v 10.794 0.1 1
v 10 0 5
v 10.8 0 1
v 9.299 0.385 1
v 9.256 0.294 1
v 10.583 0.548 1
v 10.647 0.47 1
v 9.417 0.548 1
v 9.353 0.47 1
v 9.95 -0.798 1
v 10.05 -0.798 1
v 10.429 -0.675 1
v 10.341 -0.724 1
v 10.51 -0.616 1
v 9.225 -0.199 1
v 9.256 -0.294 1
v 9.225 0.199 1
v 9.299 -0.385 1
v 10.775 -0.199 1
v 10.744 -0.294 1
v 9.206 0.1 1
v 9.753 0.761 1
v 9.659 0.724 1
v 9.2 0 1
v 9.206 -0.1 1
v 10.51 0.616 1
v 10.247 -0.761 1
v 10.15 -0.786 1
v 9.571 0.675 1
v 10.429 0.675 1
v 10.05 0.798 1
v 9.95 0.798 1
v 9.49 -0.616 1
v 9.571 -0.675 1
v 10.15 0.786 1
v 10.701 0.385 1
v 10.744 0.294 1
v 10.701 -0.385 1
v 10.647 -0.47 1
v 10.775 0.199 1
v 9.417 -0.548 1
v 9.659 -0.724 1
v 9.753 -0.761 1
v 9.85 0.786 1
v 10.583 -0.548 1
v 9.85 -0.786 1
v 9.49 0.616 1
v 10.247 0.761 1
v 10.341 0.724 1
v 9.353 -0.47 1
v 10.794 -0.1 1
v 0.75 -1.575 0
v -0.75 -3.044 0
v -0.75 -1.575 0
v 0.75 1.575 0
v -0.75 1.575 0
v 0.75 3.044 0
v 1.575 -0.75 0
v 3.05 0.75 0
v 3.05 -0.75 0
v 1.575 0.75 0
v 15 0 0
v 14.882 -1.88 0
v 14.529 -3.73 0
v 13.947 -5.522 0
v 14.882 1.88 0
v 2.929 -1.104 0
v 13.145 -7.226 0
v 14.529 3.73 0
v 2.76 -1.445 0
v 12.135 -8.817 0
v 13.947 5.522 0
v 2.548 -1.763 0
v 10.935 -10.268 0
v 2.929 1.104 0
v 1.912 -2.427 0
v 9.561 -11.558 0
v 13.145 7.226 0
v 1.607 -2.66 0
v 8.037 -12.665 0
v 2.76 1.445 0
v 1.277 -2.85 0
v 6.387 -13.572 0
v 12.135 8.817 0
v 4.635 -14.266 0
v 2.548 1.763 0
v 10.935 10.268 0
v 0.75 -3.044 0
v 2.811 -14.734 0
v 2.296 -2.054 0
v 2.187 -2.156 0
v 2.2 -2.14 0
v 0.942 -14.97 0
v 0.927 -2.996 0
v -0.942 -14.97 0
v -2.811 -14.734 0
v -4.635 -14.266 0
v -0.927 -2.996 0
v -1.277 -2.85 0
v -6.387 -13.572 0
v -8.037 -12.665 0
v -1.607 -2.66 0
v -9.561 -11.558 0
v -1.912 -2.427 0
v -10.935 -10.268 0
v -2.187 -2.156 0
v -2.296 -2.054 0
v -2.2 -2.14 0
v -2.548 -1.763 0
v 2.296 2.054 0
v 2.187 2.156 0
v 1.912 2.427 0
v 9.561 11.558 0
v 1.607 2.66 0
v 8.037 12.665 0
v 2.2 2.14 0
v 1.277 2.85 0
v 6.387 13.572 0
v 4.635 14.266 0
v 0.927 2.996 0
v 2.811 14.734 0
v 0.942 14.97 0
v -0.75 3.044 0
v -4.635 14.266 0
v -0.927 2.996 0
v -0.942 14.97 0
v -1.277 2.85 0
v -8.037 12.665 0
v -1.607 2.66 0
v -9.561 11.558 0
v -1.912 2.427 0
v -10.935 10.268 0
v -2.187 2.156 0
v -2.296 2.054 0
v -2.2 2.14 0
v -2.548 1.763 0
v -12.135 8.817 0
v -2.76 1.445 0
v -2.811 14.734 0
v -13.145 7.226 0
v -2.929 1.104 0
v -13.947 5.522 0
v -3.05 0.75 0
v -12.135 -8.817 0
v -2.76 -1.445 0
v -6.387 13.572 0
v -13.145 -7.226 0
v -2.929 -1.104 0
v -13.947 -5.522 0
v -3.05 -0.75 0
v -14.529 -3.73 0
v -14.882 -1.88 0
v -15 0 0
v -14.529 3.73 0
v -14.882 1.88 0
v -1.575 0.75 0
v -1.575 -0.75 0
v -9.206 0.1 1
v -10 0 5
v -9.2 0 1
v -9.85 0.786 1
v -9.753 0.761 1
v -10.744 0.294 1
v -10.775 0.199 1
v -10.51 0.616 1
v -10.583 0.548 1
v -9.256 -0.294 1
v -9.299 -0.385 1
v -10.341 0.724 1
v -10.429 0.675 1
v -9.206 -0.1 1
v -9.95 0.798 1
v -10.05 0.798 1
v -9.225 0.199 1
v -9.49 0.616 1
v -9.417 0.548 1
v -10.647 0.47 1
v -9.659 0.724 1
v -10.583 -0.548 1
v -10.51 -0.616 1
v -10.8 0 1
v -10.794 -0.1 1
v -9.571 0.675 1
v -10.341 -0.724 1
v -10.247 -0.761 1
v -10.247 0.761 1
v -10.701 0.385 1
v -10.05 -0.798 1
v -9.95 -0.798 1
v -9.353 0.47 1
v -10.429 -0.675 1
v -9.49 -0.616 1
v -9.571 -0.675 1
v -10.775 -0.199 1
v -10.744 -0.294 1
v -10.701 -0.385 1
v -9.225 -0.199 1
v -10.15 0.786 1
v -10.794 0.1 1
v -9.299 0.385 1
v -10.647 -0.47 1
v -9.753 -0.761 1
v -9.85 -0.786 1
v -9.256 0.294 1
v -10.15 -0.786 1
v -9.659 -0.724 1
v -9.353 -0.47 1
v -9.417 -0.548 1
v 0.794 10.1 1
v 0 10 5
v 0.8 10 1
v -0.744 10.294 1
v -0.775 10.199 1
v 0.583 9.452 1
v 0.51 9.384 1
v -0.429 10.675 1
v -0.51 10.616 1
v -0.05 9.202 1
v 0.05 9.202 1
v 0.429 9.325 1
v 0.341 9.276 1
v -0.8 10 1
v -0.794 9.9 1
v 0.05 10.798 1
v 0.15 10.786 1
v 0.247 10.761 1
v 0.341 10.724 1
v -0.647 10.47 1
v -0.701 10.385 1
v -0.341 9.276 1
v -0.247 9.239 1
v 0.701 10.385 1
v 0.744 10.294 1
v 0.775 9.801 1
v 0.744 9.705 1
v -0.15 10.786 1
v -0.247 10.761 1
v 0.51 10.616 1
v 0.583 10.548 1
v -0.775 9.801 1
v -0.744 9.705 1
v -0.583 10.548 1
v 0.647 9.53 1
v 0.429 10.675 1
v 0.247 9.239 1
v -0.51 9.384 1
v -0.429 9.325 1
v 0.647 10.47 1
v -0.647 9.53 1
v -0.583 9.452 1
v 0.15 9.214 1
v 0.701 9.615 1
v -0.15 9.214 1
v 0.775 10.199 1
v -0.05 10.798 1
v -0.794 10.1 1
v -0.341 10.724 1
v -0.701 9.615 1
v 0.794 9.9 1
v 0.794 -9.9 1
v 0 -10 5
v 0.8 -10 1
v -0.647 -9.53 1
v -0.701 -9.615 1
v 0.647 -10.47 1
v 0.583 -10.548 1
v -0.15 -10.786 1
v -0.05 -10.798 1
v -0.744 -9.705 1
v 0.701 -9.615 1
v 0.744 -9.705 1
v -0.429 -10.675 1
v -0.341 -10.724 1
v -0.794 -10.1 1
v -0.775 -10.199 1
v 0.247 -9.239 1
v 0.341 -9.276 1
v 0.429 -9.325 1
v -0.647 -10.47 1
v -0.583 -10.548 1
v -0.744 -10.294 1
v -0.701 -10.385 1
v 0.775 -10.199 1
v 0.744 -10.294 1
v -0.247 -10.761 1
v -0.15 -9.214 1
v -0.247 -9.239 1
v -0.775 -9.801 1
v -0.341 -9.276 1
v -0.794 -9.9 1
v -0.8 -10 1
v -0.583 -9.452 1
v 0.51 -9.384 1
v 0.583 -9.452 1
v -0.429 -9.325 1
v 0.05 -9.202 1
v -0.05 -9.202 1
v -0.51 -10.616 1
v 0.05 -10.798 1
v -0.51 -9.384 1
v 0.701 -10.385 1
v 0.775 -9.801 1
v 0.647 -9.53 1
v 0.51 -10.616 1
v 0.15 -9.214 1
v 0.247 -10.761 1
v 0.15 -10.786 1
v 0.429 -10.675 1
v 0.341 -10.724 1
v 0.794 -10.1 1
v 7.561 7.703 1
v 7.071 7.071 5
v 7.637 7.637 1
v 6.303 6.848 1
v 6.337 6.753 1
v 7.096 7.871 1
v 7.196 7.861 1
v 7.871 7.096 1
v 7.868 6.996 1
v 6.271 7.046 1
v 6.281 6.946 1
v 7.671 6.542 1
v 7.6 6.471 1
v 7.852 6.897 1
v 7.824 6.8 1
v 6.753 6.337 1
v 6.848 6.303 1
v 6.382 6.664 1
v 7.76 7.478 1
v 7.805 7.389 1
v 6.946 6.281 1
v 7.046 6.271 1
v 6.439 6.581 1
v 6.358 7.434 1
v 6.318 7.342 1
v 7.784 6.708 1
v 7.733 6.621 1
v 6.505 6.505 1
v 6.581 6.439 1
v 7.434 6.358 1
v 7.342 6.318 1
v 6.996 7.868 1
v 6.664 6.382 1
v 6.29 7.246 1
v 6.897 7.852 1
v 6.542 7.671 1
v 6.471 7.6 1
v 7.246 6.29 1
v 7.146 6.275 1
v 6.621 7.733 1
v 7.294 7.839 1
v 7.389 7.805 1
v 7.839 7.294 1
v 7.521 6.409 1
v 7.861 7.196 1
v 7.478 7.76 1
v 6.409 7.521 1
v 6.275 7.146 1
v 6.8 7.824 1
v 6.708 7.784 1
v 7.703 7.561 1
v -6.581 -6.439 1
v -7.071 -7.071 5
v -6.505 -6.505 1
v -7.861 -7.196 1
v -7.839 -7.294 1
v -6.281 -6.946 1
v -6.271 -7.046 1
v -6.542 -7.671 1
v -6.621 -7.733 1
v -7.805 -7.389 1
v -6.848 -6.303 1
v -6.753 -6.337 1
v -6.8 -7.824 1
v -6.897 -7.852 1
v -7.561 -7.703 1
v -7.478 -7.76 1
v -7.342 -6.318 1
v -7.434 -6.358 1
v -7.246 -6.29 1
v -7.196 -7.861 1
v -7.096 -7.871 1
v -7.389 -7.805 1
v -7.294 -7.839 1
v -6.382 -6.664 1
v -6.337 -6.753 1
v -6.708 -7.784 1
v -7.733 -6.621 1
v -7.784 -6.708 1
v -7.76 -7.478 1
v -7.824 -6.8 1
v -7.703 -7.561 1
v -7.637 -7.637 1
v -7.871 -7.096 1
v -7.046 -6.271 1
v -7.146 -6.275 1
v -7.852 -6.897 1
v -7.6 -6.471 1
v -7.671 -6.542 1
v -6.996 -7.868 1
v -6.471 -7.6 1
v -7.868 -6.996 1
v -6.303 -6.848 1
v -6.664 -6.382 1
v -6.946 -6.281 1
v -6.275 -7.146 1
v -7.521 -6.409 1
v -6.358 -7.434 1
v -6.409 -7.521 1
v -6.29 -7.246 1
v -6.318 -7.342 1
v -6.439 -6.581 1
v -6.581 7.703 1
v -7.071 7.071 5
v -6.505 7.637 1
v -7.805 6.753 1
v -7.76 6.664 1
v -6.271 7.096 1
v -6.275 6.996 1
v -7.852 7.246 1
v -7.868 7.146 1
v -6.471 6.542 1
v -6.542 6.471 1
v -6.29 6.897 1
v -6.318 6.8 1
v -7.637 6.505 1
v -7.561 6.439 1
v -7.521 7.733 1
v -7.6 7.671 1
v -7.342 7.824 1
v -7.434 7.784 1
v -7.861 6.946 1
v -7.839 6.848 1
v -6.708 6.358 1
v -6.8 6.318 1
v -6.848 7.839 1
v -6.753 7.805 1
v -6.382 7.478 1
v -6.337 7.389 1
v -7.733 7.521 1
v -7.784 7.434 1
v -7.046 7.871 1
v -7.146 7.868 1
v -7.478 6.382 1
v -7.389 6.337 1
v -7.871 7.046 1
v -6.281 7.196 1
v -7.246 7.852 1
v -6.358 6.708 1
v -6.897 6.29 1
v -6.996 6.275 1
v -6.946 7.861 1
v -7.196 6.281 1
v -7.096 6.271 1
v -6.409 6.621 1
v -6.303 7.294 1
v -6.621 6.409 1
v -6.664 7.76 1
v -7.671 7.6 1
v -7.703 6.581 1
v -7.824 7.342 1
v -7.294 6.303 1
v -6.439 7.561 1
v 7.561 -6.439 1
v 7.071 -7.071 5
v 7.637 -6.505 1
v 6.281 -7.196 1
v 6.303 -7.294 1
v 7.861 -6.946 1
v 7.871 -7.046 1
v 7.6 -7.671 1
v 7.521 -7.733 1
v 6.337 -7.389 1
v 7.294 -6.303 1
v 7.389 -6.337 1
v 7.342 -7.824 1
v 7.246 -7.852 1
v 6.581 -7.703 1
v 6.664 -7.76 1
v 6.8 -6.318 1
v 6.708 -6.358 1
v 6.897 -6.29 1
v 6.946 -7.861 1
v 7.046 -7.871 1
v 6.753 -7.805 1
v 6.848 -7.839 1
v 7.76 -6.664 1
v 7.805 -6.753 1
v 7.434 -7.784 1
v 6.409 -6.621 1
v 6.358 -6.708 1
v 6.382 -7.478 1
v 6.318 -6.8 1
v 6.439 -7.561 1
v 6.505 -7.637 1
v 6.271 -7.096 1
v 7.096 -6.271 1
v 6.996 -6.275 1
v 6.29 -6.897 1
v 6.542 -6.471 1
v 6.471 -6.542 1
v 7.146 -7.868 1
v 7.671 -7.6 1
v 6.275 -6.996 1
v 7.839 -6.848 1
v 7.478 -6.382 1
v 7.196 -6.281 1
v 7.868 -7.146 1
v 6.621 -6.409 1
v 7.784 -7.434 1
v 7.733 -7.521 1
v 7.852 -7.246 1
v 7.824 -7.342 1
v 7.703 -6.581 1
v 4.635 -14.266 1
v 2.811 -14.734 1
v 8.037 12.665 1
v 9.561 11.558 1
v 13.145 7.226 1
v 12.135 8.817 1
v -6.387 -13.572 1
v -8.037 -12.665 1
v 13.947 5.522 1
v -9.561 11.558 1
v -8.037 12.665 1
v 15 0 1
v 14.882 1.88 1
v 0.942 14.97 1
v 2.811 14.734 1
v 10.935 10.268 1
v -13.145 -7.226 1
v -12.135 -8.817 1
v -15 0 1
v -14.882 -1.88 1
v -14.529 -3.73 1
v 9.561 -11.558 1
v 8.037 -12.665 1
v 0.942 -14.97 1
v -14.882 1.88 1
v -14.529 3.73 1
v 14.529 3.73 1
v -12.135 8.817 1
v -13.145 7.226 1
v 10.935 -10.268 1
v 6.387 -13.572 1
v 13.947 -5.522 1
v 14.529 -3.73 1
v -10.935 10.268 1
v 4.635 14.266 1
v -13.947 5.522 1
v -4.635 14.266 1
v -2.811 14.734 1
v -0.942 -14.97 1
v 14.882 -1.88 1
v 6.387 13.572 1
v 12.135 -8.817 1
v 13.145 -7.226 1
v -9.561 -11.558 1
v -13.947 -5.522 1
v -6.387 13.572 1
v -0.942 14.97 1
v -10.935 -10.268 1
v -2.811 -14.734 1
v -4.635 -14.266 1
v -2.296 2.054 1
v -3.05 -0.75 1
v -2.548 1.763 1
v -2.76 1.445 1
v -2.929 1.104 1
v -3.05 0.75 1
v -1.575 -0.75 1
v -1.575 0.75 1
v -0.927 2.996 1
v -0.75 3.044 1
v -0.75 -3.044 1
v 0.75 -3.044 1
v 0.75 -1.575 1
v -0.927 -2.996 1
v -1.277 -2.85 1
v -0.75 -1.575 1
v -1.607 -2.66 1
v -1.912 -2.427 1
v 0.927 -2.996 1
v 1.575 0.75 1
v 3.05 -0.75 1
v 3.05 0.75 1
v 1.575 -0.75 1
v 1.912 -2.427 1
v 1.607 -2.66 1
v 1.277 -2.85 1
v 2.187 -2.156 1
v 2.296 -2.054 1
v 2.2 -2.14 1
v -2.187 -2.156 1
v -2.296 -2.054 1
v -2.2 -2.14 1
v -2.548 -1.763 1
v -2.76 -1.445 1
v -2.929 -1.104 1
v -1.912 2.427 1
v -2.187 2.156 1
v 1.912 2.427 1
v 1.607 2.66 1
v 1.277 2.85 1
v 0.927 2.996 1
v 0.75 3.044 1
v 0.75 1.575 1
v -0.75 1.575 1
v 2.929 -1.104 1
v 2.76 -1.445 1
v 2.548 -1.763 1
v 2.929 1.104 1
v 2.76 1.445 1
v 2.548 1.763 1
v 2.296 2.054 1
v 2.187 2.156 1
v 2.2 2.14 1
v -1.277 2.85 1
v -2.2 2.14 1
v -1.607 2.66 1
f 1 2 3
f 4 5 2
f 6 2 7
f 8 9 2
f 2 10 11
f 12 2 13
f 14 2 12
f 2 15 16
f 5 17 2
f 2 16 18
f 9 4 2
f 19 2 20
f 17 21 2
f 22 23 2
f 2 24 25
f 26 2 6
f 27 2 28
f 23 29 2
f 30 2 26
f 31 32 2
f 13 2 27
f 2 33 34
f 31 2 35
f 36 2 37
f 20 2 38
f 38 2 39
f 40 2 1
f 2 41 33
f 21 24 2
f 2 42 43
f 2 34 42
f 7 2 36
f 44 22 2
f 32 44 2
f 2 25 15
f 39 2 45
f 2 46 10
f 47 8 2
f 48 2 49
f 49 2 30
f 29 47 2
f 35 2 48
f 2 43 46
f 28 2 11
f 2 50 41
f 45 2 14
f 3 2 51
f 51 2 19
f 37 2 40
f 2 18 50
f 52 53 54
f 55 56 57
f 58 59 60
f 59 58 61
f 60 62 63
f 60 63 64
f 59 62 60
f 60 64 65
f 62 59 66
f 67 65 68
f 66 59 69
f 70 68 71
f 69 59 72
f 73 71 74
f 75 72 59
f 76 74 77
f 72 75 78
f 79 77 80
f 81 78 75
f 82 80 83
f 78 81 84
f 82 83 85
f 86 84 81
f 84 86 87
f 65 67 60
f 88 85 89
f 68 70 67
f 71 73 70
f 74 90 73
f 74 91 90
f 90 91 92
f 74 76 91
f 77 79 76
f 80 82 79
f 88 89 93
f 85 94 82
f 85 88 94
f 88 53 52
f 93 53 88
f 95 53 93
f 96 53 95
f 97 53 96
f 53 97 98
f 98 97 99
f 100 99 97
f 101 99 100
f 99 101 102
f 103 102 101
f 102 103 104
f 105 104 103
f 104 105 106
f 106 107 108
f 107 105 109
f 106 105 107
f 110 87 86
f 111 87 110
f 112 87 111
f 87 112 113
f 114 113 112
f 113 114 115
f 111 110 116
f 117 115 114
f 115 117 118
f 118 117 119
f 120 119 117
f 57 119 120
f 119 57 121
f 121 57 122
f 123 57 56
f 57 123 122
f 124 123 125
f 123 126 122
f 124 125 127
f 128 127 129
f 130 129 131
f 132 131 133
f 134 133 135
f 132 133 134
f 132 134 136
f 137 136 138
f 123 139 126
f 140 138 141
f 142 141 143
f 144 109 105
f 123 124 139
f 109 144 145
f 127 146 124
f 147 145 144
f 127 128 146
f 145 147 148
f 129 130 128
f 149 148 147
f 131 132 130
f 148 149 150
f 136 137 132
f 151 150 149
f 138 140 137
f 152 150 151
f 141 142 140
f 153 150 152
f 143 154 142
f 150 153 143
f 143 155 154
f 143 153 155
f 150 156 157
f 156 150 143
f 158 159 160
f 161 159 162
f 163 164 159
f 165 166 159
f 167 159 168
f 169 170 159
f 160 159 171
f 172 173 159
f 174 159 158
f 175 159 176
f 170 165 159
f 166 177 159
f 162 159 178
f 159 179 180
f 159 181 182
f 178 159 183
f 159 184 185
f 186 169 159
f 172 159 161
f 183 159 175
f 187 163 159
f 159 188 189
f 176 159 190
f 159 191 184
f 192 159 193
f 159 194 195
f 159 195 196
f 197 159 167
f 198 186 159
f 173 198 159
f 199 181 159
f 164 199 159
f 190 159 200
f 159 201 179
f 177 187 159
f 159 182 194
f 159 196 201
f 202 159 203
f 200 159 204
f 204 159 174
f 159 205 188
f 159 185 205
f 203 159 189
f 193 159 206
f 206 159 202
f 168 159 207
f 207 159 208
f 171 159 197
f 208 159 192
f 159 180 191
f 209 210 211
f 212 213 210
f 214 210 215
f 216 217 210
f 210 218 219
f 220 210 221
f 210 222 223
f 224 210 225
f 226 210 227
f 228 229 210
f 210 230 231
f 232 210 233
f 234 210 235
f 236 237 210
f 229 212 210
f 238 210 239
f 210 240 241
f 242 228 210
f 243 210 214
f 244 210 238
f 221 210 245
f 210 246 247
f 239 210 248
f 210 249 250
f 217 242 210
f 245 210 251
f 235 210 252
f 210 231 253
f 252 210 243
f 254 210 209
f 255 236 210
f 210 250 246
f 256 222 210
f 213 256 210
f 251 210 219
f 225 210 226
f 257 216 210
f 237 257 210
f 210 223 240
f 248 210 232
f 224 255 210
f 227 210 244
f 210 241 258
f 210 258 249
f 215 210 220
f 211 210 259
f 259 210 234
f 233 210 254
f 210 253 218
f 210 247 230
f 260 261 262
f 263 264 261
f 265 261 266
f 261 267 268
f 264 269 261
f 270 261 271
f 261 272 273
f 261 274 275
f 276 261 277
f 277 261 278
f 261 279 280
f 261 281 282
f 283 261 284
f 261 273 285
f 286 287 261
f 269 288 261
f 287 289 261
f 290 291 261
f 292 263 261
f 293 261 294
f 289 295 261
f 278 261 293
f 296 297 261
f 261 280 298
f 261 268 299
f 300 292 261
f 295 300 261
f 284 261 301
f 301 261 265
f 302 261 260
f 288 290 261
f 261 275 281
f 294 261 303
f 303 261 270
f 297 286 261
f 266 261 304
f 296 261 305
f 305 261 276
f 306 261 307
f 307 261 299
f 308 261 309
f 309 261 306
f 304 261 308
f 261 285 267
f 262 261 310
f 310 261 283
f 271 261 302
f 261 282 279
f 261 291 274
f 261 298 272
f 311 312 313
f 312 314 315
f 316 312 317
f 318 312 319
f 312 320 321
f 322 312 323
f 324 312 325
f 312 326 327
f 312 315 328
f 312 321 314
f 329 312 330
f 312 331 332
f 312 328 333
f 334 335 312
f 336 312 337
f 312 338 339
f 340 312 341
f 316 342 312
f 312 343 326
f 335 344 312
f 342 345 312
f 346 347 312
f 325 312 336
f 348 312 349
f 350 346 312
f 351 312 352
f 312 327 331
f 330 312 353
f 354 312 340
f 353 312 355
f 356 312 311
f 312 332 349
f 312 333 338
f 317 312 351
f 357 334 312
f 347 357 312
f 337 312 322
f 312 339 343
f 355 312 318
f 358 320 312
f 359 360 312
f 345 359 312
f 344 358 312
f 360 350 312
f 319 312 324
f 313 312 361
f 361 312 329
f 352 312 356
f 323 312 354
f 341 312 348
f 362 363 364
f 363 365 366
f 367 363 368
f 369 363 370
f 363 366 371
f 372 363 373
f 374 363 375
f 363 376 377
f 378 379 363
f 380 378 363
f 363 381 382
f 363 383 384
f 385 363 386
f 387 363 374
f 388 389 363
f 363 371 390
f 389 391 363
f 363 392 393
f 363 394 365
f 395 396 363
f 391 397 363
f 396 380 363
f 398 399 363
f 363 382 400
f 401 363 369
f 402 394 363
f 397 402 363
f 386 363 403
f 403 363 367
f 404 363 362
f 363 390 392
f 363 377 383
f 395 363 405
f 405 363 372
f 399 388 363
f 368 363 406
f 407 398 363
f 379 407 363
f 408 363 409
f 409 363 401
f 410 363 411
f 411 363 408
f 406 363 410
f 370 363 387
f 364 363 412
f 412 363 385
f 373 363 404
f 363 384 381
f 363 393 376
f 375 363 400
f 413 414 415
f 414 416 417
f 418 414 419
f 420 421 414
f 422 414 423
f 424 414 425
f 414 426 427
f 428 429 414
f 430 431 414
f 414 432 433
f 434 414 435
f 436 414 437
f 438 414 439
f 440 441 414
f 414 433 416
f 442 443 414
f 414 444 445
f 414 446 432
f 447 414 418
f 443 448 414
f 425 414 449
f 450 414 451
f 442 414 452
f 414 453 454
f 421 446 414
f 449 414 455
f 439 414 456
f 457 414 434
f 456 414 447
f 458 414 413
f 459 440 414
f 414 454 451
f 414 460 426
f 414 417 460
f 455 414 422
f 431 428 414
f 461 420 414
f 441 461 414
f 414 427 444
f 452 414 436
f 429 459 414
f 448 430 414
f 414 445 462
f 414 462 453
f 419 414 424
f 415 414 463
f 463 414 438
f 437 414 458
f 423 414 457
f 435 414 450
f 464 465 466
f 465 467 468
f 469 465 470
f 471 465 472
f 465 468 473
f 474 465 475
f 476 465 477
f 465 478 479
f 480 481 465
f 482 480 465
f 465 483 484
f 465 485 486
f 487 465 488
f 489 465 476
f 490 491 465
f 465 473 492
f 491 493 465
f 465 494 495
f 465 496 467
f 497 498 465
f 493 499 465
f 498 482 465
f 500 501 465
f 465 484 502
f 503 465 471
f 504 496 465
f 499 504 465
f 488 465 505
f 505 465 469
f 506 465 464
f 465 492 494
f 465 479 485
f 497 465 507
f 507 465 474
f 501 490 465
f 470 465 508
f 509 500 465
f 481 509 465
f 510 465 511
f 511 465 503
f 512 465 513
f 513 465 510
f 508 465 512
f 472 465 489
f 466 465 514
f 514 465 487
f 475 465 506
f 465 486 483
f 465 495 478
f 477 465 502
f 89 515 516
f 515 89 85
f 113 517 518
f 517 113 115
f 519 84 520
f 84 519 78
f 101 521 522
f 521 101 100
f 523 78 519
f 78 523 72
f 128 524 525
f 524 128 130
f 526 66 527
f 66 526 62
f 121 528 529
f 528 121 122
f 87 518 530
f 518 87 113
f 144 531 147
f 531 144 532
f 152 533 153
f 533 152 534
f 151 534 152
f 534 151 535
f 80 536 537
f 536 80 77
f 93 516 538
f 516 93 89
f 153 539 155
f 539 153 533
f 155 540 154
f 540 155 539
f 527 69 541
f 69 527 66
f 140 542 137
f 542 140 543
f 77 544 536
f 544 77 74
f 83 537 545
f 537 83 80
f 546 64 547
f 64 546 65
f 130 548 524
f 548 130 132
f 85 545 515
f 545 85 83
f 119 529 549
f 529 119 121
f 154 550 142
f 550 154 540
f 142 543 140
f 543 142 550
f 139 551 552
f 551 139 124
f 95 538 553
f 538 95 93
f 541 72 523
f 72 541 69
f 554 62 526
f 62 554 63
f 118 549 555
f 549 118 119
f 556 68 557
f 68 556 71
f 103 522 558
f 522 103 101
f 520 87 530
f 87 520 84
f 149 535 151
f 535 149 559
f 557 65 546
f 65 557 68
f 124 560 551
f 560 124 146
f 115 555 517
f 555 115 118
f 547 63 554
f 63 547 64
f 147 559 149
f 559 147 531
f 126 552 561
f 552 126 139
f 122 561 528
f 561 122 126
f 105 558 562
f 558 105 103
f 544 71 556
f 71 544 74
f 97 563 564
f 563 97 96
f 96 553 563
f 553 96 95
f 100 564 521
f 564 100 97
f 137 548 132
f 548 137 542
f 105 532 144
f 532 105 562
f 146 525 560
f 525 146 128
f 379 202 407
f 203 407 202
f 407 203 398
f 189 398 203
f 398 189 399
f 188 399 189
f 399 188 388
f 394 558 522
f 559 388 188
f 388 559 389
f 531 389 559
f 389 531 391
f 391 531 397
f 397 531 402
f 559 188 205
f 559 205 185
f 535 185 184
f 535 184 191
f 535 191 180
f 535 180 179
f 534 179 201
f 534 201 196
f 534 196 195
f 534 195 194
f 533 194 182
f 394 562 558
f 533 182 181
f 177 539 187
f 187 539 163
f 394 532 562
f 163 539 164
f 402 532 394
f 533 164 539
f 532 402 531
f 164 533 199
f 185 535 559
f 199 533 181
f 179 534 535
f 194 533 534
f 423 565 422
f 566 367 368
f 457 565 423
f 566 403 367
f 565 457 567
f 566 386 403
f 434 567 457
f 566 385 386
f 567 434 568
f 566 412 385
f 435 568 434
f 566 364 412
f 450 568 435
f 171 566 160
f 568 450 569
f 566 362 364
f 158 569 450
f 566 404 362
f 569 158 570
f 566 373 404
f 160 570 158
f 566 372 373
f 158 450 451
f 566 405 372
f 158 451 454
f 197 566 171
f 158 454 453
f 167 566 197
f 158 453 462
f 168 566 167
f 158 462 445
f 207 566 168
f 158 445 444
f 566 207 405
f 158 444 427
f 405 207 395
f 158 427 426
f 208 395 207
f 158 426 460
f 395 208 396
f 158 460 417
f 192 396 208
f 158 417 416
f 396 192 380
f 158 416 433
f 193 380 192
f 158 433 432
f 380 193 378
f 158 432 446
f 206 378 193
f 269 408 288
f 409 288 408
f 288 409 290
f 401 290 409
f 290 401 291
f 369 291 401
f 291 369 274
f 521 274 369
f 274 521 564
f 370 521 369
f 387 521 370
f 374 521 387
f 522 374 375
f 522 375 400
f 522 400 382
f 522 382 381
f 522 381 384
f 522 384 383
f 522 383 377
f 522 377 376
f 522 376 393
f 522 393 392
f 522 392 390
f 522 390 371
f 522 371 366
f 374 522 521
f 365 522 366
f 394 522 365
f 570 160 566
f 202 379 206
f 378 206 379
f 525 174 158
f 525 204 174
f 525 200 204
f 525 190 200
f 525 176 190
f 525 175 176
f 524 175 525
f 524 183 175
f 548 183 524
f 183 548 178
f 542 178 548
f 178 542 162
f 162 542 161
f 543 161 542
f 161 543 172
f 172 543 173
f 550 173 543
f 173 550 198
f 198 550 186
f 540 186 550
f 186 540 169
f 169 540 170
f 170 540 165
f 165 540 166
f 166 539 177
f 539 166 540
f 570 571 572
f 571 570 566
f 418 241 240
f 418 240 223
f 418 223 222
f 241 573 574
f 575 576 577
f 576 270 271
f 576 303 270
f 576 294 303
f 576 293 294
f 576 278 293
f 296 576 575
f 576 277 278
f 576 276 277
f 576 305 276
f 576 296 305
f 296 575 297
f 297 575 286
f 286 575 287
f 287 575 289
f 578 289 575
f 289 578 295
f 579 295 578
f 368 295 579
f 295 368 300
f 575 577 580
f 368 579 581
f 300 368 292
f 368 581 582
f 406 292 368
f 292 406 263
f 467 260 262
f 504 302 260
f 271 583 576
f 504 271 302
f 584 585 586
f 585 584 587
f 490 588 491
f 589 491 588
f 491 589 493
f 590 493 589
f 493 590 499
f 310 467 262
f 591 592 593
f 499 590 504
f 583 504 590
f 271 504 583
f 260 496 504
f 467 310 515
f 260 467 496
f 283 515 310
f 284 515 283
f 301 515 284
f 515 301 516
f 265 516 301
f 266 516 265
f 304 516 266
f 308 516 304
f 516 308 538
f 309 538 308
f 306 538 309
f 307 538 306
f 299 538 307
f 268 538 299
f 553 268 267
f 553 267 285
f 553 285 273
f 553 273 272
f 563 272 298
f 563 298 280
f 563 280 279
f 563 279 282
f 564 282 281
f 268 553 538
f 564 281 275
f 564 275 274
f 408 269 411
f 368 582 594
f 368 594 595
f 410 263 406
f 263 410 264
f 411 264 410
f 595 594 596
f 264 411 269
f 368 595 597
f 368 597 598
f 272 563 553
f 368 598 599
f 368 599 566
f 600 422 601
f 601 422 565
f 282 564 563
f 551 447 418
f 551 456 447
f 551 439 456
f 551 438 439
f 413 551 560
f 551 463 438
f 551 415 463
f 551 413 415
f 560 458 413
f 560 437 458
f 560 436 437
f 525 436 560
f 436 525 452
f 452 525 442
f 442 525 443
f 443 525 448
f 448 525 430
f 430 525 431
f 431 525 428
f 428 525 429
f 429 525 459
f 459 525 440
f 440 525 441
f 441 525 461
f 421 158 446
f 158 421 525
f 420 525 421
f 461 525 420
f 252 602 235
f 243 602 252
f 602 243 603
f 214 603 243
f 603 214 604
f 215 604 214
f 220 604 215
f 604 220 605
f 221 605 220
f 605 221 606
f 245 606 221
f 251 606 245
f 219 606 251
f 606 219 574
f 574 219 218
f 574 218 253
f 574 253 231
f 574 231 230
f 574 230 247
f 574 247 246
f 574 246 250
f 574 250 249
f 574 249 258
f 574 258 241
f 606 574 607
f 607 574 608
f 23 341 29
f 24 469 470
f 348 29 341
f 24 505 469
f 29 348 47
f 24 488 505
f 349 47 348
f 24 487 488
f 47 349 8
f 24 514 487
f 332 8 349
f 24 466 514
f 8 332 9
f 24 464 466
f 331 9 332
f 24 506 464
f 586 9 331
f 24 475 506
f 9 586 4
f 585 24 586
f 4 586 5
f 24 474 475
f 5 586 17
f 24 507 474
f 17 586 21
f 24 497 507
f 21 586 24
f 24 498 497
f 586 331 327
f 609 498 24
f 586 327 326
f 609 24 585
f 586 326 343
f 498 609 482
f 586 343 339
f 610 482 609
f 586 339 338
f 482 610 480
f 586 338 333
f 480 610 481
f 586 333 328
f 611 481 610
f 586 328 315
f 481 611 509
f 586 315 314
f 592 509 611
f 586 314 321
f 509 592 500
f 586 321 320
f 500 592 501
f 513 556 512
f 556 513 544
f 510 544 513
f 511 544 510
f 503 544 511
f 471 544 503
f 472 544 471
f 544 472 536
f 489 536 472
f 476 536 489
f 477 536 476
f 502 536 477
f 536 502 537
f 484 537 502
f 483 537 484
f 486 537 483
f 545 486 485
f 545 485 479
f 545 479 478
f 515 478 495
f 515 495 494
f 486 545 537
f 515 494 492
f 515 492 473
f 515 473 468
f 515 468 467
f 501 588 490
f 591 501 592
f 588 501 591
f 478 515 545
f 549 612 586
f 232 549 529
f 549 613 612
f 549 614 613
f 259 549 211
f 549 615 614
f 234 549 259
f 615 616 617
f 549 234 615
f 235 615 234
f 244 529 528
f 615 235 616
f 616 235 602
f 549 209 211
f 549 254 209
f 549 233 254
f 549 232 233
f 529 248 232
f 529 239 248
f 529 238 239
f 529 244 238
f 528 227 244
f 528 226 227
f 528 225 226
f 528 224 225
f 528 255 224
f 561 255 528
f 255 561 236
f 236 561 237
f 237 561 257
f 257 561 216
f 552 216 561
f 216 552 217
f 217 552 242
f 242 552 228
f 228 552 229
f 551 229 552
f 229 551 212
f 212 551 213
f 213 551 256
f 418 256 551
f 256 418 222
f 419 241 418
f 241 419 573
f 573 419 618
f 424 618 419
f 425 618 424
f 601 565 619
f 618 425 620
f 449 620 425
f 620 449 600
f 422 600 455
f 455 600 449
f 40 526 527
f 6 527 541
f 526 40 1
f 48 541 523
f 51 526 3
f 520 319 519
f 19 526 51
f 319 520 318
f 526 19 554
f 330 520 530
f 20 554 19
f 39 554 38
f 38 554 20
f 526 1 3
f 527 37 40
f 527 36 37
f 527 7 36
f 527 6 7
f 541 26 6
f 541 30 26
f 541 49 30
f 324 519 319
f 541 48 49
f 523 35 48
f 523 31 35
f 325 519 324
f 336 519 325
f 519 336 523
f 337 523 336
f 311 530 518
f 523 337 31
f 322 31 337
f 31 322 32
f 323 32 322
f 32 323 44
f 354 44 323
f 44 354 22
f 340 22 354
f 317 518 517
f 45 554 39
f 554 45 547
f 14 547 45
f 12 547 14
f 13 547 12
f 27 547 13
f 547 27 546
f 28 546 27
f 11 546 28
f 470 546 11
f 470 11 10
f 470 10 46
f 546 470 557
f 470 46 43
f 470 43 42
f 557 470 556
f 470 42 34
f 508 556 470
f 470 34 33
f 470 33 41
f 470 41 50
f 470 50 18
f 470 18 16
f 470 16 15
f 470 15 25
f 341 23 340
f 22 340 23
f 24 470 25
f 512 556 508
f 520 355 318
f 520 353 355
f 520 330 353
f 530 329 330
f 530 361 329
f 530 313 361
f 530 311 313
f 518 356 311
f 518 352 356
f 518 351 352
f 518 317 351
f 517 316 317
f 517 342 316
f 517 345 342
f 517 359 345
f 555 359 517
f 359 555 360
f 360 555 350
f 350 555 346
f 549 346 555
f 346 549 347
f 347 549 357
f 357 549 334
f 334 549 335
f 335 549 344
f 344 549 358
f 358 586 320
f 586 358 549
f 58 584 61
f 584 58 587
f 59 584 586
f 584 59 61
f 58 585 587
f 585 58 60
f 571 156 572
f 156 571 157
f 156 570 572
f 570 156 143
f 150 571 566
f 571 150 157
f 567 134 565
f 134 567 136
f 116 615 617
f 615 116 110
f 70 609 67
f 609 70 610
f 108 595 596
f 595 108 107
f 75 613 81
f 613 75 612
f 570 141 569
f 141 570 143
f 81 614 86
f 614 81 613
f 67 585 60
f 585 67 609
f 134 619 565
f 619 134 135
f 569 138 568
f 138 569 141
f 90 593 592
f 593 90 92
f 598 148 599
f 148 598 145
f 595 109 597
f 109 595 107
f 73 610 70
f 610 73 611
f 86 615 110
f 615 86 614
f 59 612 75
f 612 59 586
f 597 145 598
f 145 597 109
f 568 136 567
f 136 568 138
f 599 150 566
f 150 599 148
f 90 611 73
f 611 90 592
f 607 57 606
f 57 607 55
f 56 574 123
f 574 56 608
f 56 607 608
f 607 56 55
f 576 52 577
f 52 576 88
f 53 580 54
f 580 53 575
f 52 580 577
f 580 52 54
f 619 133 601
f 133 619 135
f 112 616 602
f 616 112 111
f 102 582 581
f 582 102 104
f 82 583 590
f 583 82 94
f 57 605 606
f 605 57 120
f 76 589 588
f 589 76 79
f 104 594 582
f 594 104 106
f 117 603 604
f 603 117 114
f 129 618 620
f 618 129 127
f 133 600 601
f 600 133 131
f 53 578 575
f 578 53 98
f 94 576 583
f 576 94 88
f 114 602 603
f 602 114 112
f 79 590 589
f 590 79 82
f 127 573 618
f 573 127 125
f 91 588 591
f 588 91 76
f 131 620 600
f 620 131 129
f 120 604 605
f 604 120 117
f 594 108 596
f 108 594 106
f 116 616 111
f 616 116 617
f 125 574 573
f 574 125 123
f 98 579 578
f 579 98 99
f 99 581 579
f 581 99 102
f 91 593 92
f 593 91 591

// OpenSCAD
length = 240;
rod_diameter = 6;
connector_diameter = 2;
connector_height = 30;
shield_diameter = 30;
shield_height = 1;
$fn = 50;
use_spikes = true;
fitting_scale = 1.05;

// set();
// rod();
shield(true);

module set() {
    rod();
    translate([shield_diameter*1.05,0,0]) {
        shield(true);
    }
}

module rod(with_shield=true) {
    difference() {
        cylinder(d = rod_diameter, h = length, center = false);
        cube_size = rod_diameter/4;
        cube_distance = rod_diameter/2-cube_size/2;
        translate([0,0,length/2]) {
            
            translate([0,cube_distance,0]) {
                cube([cube_size,cube_size,length], center=true);
            }
            translate([0,-cube_distance,0]) {
                cube([cube_size,cube_size,length], center=true);
            }
            translate([cube_distance,0,0]) {
                cube([cube_size,cube_size,length], center=true);
            }
            translate([-cube_distance,0,0]) {
                cube([cube_size,cube_size,length], center=true);
            }
        }
    }
    if(with_shield) {
        shield();
        translate([0,0,length-connector_height/2]) {
            //shield();
        }
    }
}

module shield(removeable=false) {
    difference() {
        union() {
            cylinder(d = shield_diameter, h = shield_height, center = false);
            if(use_spikes) {
            spikes();
                rotate([0,0,45]) {
                    spikes();
                }
            }
        }
        if(removeable) {
            scale([fitting_scale,1,1]) {
                rod(false);
            }
            scale([1,fitting_scale,1]) {
                rod(false);
            }
        }
    }
}

module spikes() {
    translate([shield_diameter/3,0,0]) {
        spike();
    }
    translate([-shield_diameter/3,0,0]) {
        spike();
    }
    translate([0,shield_diameter/3,0]) {
        spike();
    }
    translate([0,-shield_diameter/3,0]) {
        spike();
    }
}

module spike(distance) {
    height = 5;
    translate([0,0,height/2]) {
        cylinder(h = height, r1 = 1, r2 = 0, center = true);
    }
}
